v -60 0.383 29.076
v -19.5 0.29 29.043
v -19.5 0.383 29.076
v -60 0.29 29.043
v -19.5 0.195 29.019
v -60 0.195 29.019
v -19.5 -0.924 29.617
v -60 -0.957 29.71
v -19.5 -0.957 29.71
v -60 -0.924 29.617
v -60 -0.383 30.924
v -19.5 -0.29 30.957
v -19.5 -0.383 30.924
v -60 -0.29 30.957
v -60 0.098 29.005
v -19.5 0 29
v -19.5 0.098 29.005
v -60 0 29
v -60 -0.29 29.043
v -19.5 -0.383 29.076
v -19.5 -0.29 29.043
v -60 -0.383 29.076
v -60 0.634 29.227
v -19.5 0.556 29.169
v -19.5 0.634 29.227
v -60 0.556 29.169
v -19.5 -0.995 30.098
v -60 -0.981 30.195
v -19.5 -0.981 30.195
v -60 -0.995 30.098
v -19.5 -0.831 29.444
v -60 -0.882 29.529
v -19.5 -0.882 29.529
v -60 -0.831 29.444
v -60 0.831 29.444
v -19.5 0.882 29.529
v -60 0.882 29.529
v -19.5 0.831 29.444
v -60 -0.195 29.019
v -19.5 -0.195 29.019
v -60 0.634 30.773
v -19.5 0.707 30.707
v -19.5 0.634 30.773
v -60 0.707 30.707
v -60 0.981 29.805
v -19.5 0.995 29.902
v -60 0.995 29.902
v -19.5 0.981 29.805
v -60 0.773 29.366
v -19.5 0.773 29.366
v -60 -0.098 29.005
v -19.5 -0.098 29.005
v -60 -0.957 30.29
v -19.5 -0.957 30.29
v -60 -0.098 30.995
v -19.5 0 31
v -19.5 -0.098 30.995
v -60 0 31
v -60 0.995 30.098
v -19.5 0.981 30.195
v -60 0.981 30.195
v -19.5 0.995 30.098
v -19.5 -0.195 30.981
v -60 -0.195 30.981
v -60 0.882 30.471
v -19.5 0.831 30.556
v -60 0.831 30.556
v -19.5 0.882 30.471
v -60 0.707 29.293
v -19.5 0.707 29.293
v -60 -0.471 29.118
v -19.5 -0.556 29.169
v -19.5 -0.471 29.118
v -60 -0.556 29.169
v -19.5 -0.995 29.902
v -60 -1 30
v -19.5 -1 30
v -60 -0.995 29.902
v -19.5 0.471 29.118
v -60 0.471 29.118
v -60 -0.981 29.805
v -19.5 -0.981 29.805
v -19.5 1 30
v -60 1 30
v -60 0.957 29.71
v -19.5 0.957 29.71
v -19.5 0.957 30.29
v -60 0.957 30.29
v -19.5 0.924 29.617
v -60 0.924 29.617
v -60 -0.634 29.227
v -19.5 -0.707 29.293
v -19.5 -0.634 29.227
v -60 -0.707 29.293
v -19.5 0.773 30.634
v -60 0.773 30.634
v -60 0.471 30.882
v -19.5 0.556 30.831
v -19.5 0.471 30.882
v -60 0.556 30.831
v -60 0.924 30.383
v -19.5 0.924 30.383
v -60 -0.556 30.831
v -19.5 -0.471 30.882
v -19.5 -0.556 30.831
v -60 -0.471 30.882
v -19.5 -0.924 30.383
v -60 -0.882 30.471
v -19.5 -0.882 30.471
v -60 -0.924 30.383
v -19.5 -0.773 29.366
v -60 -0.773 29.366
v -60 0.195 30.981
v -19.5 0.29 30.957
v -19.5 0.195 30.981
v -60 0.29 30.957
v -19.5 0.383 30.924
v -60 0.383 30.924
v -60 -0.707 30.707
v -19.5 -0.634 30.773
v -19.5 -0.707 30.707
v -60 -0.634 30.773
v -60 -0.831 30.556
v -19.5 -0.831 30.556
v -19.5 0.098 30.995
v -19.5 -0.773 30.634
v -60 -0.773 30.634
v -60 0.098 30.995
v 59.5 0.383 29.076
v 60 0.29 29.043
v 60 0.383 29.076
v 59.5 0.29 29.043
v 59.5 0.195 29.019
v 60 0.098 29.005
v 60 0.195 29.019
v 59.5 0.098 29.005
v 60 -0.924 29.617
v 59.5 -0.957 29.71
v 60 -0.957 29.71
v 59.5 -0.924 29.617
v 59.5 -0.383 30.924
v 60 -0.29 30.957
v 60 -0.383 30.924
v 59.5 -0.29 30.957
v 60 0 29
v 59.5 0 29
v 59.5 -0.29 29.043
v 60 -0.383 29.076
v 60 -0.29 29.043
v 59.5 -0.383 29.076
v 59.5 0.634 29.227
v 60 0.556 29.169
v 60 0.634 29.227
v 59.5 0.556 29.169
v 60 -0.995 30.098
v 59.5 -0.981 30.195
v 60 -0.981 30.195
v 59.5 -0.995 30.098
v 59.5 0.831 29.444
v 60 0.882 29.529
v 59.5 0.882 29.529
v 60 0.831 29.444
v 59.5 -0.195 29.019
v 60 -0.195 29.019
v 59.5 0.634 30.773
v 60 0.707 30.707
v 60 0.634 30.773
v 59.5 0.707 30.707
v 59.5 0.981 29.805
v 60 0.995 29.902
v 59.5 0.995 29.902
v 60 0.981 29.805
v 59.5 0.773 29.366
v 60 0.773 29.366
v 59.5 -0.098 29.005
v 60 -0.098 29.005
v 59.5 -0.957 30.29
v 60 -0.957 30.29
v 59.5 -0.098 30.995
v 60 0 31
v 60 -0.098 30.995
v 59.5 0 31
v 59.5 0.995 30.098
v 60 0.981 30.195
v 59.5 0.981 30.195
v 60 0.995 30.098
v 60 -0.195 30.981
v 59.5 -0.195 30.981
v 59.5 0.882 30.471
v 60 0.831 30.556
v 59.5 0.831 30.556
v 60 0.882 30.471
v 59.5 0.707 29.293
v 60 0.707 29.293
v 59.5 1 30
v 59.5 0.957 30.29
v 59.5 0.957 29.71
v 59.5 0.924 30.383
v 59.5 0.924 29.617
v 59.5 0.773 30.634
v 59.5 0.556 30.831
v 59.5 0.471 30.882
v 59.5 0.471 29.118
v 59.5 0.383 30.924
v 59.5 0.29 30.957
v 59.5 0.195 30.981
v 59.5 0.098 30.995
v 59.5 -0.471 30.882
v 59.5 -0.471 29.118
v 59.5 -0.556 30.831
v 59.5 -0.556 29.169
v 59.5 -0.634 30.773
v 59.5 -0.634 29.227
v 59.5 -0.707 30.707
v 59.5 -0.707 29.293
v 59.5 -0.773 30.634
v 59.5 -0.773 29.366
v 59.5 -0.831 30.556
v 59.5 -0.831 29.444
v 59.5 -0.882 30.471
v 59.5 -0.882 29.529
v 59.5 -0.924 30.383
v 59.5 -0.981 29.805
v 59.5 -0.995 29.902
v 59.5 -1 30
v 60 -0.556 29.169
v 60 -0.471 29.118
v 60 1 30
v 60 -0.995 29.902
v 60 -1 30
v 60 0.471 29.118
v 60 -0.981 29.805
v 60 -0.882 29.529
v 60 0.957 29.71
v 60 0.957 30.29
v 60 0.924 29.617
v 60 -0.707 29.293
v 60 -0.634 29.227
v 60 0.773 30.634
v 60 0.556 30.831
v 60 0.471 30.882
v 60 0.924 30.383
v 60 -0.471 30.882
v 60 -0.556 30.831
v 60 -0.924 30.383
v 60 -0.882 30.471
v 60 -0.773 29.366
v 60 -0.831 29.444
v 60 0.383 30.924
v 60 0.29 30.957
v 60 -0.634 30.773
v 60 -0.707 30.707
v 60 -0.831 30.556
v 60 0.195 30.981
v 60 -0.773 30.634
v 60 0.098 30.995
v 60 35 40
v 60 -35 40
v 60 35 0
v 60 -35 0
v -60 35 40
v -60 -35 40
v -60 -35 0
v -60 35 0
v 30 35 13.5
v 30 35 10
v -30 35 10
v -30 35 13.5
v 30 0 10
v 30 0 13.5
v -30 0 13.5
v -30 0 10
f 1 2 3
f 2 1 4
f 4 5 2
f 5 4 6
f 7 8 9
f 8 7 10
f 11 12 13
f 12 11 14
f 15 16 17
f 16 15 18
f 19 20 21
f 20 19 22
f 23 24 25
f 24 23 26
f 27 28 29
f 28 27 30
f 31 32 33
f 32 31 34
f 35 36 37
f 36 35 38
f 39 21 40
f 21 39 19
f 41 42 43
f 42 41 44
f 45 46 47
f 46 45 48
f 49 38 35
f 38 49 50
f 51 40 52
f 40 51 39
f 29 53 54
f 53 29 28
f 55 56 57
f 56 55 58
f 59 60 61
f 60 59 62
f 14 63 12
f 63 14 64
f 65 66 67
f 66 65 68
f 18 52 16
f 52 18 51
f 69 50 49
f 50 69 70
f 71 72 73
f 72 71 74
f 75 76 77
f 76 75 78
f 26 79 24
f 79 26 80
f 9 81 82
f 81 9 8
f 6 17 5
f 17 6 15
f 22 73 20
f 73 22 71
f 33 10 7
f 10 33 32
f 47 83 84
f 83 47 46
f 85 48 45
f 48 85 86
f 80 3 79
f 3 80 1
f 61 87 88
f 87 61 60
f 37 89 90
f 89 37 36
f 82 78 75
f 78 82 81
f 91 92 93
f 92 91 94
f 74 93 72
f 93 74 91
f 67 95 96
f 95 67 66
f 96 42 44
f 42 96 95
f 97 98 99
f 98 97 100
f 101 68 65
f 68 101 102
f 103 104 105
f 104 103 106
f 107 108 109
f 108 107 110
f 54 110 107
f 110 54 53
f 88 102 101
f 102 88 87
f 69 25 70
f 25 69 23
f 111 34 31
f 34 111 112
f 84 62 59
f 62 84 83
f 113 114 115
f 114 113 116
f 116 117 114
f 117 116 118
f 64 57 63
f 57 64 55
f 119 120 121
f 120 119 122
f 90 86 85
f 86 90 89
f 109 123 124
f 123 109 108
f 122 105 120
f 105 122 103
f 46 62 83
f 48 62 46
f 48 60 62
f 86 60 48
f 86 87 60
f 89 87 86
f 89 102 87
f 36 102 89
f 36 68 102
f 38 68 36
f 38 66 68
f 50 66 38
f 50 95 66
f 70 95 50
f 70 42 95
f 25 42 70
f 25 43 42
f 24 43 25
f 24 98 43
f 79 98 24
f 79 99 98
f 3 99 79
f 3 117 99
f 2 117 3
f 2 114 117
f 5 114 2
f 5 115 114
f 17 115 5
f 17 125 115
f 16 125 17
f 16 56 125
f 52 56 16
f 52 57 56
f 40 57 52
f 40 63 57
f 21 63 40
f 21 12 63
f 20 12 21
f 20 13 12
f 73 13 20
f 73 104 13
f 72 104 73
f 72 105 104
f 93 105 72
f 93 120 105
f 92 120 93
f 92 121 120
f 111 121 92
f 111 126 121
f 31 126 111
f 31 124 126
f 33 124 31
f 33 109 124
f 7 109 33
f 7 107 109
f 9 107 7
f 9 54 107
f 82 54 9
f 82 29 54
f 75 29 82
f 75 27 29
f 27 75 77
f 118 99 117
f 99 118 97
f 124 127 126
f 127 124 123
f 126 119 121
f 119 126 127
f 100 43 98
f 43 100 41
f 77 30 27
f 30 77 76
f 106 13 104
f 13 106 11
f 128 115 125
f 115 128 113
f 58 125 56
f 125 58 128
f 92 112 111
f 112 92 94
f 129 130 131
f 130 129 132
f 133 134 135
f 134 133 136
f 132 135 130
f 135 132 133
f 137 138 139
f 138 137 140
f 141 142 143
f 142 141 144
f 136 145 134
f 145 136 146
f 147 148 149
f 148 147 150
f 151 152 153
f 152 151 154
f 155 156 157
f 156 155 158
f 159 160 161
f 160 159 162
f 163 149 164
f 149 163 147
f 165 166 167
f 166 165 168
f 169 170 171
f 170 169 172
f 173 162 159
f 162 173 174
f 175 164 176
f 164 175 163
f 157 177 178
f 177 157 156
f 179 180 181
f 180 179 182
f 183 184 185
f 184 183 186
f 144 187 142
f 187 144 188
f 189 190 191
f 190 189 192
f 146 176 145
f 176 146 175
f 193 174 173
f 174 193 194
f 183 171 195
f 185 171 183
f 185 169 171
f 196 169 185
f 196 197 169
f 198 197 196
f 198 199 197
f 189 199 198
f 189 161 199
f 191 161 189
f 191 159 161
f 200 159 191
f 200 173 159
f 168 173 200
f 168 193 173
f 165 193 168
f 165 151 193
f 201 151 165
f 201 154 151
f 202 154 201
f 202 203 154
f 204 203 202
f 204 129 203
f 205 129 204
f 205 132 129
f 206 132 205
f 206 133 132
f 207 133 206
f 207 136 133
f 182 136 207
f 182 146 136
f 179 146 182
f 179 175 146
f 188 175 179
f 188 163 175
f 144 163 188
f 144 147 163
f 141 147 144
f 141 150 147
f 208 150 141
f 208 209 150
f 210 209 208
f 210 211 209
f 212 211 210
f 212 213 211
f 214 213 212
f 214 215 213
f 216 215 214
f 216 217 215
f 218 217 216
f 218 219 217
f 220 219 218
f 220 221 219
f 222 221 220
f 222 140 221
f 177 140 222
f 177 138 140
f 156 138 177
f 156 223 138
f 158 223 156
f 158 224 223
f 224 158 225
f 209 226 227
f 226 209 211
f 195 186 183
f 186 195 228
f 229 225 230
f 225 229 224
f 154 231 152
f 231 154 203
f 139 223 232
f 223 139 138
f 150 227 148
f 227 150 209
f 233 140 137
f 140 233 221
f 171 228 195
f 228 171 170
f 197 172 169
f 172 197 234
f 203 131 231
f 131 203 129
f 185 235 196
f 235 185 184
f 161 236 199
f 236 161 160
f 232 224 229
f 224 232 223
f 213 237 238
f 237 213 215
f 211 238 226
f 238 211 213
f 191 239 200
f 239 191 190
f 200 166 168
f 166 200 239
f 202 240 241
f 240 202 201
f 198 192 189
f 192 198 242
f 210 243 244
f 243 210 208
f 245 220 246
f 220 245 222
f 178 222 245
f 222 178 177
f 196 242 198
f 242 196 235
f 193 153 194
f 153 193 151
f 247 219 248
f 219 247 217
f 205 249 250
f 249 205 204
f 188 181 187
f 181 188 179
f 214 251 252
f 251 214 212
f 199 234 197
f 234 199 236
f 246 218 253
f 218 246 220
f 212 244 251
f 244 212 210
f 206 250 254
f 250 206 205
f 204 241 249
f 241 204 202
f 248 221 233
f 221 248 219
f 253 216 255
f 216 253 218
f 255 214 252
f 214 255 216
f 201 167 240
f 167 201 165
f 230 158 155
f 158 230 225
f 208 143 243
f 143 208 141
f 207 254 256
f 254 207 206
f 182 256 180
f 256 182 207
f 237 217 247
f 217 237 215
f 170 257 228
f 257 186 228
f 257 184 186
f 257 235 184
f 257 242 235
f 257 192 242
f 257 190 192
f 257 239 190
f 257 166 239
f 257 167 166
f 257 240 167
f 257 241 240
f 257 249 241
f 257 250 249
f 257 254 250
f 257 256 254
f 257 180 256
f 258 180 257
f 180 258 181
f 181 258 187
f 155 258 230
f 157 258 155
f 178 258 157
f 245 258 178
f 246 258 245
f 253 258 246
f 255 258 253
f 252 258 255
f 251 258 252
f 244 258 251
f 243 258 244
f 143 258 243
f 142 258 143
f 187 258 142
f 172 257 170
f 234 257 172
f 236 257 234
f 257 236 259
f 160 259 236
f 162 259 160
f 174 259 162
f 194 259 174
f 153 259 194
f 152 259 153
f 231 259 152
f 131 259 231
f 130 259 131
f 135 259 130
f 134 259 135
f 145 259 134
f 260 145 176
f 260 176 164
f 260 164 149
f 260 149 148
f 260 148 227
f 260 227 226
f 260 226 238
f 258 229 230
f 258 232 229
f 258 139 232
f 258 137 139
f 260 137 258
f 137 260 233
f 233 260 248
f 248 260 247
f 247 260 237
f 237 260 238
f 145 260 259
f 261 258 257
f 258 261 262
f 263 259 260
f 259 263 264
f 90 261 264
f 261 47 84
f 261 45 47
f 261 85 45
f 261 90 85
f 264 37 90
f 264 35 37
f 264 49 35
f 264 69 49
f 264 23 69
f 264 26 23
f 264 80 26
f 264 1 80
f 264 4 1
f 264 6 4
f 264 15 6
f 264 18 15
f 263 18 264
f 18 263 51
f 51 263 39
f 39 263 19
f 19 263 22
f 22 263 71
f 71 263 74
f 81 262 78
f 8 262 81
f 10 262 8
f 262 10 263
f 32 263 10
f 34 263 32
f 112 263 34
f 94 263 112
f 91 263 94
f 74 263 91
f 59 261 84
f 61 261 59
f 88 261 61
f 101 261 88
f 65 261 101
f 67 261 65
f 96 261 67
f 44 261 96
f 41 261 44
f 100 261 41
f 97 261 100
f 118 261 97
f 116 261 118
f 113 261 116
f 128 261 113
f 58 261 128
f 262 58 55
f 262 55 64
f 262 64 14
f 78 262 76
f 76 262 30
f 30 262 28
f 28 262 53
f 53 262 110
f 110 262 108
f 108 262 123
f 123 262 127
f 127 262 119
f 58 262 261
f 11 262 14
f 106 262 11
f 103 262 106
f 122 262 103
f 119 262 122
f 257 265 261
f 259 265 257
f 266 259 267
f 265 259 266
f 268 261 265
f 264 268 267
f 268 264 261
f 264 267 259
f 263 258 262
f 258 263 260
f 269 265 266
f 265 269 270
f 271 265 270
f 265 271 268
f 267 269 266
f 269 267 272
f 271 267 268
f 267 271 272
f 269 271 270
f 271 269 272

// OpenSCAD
// Mini horizontal gel-electrophoresis box - buffer tank
// Print orientation: tank rests on XY plane, builds up +Z

$fn = 64;

// ---- Tank ----
tank_x = 120;      // outer length (X)
tank_y = 70;       // outer width (Y)
tank_z = 40;       // outer height (Z)
wall   = 3;        // wall thickness
floor  = 3;        // floor thickness

// ---- Platform ----
plat_x = 60;       // platform length in X (centred)
plat_y = tank_y - 2*wall;  // spans full inner width
plat_top = floor + 10;  // top of platform, 10 mm above inner floor

// ---- Holes ----
hole_d = 2;        // electrode wire hole diameter
hole_y = 0;        // hole Y position
hole_z = 30;       // hole Z position

// ---- Misc ----
eps = 0.5;         // cutter overshoot past faces

difference() {
    // Tank body
    translate([-tank_x/2, -tank_y/2, 0])
        cube([tank_x, tank_y, tank_z]);

    // Raised platform (solid, no cut through walls)
    translate([-plat_x/2, 0, plat_top - wall])
        cube([plat_x, plat_y, wall + eps]);

    // Horizontal electrode holes through end walls
    for (sx = [-1, 1])
        translate([sx > 0 ? tank_x/2 - eps : -tank_x/2 - eps, hole_y, hole_z])
            rotate([0, 90, 0])
                cylinder(d = hole_d, h = tank_z + 2*eps);
}
